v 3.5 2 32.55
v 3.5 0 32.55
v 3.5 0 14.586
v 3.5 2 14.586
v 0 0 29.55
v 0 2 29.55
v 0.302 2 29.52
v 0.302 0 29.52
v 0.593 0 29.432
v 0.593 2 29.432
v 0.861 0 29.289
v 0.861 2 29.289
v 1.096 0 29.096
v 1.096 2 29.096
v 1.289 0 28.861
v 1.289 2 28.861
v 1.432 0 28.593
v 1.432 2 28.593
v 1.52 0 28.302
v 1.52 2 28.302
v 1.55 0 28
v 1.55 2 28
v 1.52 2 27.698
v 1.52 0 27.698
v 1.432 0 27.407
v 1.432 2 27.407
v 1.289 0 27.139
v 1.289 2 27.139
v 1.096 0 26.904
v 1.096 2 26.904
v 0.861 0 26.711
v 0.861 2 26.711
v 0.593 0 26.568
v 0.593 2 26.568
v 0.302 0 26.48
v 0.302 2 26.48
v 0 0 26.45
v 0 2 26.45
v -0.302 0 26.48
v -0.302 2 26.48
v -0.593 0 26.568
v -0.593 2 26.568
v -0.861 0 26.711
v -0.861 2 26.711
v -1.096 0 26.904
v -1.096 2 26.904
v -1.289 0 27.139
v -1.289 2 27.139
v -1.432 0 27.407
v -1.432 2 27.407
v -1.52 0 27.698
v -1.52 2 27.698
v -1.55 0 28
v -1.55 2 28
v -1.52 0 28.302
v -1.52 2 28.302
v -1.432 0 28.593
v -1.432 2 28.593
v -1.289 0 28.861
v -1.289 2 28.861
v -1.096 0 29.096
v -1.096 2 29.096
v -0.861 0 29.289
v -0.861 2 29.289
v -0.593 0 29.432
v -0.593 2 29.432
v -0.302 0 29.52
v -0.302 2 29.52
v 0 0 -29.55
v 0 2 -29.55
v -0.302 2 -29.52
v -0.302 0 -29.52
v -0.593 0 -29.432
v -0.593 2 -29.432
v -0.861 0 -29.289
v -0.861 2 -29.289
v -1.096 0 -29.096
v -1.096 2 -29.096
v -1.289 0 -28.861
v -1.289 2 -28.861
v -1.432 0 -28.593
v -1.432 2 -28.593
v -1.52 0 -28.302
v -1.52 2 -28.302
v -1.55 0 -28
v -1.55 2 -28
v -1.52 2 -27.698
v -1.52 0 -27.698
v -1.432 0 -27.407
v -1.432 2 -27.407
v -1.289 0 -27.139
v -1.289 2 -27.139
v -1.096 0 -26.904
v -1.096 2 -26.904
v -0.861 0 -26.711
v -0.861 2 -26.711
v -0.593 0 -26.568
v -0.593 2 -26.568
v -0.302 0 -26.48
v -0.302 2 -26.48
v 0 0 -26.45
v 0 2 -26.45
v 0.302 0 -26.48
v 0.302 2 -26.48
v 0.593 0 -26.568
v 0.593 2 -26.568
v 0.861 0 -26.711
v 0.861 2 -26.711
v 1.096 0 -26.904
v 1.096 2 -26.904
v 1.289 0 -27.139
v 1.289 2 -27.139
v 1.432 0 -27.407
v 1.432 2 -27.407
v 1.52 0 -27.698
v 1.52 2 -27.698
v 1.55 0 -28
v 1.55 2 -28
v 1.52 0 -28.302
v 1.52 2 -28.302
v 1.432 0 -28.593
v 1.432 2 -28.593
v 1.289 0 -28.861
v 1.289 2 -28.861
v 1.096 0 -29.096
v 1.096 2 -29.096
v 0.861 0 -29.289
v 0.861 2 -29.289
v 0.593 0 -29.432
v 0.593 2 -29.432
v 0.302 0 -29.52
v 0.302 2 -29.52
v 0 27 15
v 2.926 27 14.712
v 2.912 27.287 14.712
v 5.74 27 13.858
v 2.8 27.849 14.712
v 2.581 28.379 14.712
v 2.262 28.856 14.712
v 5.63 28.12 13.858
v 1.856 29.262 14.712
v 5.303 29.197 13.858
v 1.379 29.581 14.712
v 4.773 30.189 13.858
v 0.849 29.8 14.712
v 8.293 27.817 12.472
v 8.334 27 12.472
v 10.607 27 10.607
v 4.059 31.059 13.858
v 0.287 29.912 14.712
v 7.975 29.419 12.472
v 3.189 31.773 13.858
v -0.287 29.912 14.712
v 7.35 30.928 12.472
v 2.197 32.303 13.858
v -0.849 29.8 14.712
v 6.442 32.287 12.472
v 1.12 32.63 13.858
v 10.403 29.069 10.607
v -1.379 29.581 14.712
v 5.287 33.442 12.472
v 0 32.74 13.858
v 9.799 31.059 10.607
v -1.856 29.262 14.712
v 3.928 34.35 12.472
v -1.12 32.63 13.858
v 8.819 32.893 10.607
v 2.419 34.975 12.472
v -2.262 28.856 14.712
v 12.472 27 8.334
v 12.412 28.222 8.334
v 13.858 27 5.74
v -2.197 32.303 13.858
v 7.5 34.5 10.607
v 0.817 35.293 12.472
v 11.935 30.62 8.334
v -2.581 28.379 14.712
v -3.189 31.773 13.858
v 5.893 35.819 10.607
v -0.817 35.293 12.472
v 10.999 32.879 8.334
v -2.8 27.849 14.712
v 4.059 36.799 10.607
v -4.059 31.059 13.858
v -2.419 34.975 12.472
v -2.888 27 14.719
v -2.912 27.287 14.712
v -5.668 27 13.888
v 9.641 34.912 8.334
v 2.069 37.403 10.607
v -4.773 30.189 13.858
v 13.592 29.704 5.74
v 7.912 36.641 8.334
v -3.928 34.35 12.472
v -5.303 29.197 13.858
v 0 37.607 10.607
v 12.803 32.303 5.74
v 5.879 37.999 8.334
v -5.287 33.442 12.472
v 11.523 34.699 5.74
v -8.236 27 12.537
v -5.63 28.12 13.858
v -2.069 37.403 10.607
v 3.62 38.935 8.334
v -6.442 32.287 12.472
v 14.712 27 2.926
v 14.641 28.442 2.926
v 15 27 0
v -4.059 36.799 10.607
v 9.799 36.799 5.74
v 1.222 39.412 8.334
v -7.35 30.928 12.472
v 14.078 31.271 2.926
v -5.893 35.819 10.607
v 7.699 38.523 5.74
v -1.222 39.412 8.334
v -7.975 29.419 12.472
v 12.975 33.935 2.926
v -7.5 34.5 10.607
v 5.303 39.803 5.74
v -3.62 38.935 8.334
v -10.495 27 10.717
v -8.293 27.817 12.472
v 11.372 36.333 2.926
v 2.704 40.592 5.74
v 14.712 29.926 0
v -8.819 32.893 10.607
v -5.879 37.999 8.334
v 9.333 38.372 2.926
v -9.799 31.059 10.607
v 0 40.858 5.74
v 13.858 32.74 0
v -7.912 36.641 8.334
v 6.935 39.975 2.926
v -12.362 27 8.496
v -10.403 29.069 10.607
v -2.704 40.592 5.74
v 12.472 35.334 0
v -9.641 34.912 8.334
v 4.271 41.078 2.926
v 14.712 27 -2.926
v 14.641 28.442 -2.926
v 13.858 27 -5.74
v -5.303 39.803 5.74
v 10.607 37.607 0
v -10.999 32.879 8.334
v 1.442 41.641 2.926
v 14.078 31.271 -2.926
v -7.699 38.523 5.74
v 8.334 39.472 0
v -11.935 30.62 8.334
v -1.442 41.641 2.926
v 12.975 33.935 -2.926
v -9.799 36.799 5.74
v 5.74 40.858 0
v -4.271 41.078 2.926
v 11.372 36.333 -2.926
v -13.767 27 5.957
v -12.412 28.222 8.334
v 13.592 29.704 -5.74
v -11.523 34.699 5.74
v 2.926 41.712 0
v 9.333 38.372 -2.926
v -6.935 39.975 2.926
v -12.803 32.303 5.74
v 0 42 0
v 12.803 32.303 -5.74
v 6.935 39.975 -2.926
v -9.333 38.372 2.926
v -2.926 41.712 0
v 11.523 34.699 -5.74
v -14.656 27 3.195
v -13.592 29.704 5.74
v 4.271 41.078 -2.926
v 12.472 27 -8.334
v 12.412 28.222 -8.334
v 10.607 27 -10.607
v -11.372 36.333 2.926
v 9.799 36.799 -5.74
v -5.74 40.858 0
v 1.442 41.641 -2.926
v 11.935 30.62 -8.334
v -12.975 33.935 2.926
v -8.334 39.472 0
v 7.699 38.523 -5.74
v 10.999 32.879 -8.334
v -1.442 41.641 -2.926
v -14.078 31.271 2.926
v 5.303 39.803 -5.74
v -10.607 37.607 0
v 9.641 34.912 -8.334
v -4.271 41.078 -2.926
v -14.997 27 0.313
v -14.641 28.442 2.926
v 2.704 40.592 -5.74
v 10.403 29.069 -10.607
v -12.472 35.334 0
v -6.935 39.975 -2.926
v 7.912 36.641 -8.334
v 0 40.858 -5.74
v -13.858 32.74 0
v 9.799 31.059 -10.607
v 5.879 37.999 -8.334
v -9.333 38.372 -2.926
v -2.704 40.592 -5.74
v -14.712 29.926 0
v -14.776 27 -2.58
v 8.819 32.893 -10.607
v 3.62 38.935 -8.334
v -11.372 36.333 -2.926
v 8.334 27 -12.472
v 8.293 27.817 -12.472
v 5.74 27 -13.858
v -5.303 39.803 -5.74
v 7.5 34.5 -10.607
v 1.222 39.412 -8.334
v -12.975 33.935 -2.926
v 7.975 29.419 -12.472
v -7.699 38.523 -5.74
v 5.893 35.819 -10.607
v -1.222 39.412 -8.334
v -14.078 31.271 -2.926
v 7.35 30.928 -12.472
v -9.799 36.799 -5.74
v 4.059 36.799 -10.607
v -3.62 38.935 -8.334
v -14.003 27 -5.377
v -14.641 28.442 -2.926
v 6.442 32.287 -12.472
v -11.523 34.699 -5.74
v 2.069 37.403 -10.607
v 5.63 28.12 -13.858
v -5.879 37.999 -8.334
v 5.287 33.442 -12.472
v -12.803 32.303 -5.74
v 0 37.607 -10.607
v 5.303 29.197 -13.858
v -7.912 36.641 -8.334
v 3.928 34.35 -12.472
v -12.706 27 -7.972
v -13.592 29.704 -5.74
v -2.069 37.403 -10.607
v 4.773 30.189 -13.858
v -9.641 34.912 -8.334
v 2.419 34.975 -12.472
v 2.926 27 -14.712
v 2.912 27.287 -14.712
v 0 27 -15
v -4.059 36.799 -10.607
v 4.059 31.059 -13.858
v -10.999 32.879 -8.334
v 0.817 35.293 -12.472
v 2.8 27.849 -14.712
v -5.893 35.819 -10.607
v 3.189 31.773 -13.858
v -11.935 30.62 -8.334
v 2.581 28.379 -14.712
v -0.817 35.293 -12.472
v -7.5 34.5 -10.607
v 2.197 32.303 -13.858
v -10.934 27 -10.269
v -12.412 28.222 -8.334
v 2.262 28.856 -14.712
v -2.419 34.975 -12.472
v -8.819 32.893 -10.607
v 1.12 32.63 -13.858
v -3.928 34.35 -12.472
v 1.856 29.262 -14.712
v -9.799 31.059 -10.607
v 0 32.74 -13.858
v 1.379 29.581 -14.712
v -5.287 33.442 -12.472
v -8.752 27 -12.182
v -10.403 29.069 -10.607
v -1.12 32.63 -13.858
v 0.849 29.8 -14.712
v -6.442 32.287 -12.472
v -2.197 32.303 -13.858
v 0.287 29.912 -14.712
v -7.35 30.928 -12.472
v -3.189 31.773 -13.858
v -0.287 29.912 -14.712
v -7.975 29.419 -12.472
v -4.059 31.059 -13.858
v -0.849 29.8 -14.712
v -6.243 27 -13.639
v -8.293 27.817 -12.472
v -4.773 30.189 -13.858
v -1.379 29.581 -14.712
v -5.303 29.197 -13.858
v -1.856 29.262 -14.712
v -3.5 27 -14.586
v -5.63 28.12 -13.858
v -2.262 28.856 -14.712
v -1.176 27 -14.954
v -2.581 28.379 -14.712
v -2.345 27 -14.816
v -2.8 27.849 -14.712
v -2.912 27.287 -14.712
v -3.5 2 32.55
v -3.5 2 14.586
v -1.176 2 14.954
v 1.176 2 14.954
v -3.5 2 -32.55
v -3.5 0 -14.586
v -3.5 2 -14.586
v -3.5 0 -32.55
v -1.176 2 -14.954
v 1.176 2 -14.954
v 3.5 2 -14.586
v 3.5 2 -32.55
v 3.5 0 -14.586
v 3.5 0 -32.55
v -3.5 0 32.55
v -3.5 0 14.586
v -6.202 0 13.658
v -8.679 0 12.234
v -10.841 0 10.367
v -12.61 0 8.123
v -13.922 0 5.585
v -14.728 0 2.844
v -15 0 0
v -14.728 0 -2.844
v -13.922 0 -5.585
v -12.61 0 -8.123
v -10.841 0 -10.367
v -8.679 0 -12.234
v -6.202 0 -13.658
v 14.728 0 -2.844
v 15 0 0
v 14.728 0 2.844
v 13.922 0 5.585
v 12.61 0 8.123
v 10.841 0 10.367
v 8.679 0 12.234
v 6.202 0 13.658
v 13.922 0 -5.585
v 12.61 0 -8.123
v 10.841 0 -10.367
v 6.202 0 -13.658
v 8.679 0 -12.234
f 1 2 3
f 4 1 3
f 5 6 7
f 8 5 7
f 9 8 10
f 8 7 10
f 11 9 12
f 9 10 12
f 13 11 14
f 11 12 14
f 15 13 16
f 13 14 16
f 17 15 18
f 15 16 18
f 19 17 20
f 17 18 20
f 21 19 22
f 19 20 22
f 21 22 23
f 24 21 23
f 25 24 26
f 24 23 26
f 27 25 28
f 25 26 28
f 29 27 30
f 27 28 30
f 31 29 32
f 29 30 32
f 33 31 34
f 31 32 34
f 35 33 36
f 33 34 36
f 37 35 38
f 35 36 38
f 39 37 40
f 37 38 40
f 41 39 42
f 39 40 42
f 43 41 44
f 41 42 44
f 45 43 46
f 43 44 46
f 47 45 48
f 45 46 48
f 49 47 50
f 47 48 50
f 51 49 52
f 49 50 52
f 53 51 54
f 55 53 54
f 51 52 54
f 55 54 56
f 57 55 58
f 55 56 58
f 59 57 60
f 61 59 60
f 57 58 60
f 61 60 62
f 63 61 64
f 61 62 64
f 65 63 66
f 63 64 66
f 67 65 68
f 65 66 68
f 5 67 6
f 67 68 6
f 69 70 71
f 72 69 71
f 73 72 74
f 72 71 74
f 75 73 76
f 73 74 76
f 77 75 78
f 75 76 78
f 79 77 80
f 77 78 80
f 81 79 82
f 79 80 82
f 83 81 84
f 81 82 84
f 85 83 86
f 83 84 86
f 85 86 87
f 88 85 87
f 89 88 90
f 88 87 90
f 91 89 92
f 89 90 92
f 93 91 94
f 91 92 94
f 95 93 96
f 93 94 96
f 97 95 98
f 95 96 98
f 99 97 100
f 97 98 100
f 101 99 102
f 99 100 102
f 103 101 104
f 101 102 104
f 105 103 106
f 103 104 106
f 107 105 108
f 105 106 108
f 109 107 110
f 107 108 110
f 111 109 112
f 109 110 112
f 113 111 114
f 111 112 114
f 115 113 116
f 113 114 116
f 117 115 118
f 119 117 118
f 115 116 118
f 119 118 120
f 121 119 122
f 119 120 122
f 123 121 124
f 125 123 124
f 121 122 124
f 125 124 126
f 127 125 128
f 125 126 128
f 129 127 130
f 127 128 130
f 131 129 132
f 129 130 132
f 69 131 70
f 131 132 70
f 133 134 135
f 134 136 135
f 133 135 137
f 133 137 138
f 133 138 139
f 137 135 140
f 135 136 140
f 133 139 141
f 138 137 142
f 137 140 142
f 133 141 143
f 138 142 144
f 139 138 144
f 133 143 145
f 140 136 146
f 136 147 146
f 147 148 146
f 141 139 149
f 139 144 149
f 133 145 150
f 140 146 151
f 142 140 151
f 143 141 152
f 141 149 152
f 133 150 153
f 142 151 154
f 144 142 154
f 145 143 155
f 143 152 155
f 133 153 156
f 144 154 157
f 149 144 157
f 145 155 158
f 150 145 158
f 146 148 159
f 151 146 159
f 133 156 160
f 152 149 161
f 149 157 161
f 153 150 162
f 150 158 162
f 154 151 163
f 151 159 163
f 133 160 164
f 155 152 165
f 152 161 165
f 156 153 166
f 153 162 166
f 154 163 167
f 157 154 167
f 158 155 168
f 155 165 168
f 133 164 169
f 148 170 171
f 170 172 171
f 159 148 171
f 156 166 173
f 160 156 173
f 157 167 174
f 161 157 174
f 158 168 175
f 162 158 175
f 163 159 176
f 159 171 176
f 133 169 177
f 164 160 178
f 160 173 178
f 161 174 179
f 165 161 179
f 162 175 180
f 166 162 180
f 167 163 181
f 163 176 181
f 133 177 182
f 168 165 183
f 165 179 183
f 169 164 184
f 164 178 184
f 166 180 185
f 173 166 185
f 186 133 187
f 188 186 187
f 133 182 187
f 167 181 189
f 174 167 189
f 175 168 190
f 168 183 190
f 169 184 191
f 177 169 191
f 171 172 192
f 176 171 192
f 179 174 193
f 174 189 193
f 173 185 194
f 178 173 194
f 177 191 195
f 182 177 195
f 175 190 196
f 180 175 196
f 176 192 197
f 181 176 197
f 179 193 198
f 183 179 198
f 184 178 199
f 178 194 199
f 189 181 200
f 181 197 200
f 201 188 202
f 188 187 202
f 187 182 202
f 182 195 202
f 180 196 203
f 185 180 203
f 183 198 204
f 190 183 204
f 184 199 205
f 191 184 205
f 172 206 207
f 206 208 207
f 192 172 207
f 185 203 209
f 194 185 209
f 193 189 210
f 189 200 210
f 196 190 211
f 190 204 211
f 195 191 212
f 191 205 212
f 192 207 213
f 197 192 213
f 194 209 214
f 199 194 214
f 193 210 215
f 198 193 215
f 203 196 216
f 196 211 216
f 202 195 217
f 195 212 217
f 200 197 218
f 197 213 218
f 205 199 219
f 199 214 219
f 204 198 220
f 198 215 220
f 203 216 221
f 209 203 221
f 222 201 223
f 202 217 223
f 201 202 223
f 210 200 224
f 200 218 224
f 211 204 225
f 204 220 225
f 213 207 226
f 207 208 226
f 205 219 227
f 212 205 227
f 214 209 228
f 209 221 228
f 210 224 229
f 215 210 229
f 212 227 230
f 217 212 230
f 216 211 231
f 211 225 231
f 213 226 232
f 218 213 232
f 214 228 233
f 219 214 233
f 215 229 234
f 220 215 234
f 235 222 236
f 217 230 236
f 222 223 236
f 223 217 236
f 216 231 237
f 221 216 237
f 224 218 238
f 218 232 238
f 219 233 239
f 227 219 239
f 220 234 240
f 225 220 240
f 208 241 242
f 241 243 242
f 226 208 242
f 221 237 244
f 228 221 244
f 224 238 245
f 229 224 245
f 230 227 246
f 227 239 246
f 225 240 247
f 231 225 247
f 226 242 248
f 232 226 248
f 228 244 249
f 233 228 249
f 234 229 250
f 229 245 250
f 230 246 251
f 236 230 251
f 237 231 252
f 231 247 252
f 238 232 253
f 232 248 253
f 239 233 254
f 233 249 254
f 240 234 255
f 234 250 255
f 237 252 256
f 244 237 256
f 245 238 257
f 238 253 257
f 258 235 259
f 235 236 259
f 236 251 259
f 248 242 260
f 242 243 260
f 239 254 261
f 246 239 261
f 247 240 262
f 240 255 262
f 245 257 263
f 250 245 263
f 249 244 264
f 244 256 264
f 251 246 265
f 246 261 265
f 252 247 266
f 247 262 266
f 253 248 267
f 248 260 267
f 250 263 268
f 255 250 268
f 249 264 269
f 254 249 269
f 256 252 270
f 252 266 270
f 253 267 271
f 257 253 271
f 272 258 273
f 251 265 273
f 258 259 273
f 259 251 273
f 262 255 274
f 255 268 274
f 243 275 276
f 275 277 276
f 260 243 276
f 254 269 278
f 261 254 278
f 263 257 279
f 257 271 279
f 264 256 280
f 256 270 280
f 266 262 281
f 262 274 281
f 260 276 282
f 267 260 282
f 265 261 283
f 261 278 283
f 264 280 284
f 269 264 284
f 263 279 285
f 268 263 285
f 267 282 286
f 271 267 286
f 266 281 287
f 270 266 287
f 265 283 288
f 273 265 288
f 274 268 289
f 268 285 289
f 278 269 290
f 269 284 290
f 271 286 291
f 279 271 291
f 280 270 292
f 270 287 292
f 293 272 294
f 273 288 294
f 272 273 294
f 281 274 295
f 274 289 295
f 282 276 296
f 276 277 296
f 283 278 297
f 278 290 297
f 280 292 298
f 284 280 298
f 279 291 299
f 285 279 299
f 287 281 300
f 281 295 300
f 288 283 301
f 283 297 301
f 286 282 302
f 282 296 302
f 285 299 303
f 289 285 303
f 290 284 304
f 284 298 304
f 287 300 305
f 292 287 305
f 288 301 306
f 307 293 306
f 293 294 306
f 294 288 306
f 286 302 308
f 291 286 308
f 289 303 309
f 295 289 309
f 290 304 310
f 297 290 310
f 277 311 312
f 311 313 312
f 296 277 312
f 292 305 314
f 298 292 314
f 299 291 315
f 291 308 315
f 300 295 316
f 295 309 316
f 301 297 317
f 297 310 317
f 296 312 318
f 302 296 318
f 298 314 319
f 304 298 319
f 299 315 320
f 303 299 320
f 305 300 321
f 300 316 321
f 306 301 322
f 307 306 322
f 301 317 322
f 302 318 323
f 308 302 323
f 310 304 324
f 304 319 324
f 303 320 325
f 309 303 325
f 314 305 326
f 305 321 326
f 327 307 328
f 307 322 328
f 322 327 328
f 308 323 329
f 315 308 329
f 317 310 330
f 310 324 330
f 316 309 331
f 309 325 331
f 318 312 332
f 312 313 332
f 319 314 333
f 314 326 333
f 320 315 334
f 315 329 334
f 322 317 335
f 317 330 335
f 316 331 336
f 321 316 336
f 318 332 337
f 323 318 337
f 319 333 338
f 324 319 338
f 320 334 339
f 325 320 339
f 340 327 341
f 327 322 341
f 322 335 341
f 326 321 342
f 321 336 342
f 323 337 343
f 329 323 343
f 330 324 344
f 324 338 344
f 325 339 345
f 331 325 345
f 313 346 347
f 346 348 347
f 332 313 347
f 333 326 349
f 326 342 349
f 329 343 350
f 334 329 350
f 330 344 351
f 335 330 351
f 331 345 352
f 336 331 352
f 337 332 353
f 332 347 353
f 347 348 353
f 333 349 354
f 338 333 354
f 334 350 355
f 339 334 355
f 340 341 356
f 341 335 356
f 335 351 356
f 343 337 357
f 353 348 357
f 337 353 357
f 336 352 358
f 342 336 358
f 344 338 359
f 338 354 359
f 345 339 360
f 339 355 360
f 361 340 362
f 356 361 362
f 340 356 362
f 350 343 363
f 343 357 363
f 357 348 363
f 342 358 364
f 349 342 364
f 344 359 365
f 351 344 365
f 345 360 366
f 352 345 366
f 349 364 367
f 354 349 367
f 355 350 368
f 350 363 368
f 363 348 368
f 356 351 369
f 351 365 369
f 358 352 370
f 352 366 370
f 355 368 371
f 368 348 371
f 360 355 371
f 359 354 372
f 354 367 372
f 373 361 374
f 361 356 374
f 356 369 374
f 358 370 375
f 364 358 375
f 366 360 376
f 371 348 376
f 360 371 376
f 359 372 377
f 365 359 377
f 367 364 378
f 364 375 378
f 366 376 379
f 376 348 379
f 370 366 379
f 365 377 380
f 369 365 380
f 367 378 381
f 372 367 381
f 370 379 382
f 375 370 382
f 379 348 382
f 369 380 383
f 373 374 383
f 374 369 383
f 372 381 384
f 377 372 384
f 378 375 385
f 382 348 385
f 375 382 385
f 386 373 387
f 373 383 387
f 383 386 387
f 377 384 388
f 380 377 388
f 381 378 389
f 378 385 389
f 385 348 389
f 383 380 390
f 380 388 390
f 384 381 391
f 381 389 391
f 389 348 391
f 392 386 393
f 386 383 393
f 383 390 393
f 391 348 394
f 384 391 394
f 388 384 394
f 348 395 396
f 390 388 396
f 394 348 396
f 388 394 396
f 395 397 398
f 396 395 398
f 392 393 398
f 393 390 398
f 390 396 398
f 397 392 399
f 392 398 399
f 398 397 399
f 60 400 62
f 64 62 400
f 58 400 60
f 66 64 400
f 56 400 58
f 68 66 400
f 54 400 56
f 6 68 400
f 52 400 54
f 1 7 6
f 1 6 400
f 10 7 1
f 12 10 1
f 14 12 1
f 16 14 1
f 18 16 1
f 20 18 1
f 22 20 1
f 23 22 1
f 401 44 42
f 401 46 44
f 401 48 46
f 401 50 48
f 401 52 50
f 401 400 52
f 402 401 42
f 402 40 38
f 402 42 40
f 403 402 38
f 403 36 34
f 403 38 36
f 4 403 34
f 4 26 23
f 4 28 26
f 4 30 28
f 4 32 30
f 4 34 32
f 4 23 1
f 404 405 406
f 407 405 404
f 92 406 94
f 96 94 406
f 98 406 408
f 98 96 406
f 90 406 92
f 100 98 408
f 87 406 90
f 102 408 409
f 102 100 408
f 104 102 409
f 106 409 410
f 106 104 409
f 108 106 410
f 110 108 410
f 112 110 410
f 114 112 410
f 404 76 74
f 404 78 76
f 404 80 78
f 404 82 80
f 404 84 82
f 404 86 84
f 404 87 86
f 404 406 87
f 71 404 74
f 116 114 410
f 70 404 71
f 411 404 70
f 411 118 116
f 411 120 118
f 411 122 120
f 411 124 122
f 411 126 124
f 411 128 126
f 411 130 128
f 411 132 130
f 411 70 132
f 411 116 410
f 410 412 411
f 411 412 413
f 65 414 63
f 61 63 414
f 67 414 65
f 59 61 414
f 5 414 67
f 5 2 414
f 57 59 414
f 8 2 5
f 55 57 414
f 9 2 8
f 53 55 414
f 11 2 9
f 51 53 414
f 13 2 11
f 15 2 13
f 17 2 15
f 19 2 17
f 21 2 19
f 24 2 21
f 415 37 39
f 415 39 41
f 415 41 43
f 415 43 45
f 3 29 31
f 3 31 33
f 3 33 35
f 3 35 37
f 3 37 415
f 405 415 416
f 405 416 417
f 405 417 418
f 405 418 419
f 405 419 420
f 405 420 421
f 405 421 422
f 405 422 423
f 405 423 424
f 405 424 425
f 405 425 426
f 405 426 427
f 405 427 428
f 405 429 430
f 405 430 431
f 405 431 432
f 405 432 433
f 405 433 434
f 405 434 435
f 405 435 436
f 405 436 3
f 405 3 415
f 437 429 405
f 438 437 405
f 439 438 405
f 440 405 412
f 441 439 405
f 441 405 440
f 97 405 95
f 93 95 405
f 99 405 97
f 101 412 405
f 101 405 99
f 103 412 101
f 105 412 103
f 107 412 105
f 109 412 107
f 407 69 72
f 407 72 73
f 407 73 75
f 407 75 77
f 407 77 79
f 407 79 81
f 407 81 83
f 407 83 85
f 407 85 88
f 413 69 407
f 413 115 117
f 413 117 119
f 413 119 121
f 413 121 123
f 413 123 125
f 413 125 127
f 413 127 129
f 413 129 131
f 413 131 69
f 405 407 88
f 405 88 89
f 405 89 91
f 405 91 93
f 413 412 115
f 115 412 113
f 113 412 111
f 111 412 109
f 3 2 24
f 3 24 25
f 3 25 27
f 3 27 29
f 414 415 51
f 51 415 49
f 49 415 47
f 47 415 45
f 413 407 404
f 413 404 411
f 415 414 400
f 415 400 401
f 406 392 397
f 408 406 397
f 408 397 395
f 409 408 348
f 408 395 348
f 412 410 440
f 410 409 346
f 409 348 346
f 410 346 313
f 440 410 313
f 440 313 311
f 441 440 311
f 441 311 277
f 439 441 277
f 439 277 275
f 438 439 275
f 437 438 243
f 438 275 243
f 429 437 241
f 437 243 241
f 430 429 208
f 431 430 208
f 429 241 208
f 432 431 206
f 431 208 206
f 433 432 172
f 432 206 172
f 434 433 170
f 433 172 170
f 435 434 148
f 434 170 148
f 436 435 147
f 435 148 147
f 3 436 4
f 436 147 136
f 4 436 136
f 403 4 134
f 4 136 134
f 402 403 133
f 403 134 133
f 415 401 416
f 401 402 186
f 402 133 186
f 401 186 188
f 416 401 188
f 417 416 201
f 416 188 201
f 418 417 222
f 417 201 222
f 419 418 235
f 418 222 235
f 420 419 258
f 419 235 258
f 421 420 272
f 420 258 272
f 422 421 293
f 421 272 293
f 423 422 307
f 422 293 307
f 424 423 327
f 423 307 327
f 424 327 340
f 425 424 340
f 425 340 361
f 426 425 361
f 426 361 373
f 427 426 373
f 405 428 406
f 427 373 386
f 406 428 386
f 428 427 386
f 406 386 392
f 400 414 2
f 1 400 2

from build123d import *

# Parameters (mm, degrees)
SKETCH1_W           = 7
SKETCH1_H           = 65.1
BOSS_EXTRUDE1_DEPTH = 2
REVOLVE1_ANGLE      = 180
SKETCH3_R           = 15
BOSS_EXTRUDE2_DEPTH = 27
SKETCH4_R           = 1.55
CUT_EXTRUDE1_DEPTH  = 2


with BuildPart() as part:
    # Sketch1 → Boss-Extrude1 (new body)
    with BuildSketch(Plane(origin=(0, 0, 0), x_dir=(1, 0, 0), z_dir=(0, 1, 0))):
        Rectangle(SKETCH1_W, SKETCH1_H)
    extrude(amount=BOSS_EXTRUDE1_DEPTH)



with BuildPart() as body_2:
    # Sketch2 → Revolve1 (revolve)
    with BuildSketch(Plane(origin=(0, 27, 0), x_dir=(1, 0, 0), z_dir=(0, 1, 0))):
        with BuildLine():
            Line((0, 15), (0, -15))
            ThreePointArc((0, -15), (15, 0), (0, 15))
        make_face()
    revolve(axis=Axis((0, 27, -15), (0, 0, 1)), revolution_arc=REVOLVE1_ANGLE)


with BuildPart() as part_1:
    add(part.part)

    add(body_2.part)  # Boss-Extrude2 merges body 2
    # Sketch3 → Boss-Extrude2 (add, through all)
    with BuildSketch(Plane.XZ.offset(-27)):
        with Locations(Location((0, 0, 0), (0, 0, 256.506601178))):
            Circle(SKETCH3_R)
    extrude(amount=BOSS_EXTRUDE2_DEPTH)

    # Sketch4 → Cut-Extrude1 (cut)
    with BuildSketch(Plane(origin=(0, 2, 0), x_dir=(1, 0, 0), z_dir=(0, 1, 0))):
        with Locations(Location((0, -28, 0), (0, 0, 270))):
            Circle(SKETCH4_R)
        with Locations(Location((0, 28, 0), (0, 0, 90))):
            Circle(SKETCH4_R)
    extrude(amount=-CUT_EXTRUDE1_DEPTH, mode=Mode.SUBTRACT)


solid = part_1.part
